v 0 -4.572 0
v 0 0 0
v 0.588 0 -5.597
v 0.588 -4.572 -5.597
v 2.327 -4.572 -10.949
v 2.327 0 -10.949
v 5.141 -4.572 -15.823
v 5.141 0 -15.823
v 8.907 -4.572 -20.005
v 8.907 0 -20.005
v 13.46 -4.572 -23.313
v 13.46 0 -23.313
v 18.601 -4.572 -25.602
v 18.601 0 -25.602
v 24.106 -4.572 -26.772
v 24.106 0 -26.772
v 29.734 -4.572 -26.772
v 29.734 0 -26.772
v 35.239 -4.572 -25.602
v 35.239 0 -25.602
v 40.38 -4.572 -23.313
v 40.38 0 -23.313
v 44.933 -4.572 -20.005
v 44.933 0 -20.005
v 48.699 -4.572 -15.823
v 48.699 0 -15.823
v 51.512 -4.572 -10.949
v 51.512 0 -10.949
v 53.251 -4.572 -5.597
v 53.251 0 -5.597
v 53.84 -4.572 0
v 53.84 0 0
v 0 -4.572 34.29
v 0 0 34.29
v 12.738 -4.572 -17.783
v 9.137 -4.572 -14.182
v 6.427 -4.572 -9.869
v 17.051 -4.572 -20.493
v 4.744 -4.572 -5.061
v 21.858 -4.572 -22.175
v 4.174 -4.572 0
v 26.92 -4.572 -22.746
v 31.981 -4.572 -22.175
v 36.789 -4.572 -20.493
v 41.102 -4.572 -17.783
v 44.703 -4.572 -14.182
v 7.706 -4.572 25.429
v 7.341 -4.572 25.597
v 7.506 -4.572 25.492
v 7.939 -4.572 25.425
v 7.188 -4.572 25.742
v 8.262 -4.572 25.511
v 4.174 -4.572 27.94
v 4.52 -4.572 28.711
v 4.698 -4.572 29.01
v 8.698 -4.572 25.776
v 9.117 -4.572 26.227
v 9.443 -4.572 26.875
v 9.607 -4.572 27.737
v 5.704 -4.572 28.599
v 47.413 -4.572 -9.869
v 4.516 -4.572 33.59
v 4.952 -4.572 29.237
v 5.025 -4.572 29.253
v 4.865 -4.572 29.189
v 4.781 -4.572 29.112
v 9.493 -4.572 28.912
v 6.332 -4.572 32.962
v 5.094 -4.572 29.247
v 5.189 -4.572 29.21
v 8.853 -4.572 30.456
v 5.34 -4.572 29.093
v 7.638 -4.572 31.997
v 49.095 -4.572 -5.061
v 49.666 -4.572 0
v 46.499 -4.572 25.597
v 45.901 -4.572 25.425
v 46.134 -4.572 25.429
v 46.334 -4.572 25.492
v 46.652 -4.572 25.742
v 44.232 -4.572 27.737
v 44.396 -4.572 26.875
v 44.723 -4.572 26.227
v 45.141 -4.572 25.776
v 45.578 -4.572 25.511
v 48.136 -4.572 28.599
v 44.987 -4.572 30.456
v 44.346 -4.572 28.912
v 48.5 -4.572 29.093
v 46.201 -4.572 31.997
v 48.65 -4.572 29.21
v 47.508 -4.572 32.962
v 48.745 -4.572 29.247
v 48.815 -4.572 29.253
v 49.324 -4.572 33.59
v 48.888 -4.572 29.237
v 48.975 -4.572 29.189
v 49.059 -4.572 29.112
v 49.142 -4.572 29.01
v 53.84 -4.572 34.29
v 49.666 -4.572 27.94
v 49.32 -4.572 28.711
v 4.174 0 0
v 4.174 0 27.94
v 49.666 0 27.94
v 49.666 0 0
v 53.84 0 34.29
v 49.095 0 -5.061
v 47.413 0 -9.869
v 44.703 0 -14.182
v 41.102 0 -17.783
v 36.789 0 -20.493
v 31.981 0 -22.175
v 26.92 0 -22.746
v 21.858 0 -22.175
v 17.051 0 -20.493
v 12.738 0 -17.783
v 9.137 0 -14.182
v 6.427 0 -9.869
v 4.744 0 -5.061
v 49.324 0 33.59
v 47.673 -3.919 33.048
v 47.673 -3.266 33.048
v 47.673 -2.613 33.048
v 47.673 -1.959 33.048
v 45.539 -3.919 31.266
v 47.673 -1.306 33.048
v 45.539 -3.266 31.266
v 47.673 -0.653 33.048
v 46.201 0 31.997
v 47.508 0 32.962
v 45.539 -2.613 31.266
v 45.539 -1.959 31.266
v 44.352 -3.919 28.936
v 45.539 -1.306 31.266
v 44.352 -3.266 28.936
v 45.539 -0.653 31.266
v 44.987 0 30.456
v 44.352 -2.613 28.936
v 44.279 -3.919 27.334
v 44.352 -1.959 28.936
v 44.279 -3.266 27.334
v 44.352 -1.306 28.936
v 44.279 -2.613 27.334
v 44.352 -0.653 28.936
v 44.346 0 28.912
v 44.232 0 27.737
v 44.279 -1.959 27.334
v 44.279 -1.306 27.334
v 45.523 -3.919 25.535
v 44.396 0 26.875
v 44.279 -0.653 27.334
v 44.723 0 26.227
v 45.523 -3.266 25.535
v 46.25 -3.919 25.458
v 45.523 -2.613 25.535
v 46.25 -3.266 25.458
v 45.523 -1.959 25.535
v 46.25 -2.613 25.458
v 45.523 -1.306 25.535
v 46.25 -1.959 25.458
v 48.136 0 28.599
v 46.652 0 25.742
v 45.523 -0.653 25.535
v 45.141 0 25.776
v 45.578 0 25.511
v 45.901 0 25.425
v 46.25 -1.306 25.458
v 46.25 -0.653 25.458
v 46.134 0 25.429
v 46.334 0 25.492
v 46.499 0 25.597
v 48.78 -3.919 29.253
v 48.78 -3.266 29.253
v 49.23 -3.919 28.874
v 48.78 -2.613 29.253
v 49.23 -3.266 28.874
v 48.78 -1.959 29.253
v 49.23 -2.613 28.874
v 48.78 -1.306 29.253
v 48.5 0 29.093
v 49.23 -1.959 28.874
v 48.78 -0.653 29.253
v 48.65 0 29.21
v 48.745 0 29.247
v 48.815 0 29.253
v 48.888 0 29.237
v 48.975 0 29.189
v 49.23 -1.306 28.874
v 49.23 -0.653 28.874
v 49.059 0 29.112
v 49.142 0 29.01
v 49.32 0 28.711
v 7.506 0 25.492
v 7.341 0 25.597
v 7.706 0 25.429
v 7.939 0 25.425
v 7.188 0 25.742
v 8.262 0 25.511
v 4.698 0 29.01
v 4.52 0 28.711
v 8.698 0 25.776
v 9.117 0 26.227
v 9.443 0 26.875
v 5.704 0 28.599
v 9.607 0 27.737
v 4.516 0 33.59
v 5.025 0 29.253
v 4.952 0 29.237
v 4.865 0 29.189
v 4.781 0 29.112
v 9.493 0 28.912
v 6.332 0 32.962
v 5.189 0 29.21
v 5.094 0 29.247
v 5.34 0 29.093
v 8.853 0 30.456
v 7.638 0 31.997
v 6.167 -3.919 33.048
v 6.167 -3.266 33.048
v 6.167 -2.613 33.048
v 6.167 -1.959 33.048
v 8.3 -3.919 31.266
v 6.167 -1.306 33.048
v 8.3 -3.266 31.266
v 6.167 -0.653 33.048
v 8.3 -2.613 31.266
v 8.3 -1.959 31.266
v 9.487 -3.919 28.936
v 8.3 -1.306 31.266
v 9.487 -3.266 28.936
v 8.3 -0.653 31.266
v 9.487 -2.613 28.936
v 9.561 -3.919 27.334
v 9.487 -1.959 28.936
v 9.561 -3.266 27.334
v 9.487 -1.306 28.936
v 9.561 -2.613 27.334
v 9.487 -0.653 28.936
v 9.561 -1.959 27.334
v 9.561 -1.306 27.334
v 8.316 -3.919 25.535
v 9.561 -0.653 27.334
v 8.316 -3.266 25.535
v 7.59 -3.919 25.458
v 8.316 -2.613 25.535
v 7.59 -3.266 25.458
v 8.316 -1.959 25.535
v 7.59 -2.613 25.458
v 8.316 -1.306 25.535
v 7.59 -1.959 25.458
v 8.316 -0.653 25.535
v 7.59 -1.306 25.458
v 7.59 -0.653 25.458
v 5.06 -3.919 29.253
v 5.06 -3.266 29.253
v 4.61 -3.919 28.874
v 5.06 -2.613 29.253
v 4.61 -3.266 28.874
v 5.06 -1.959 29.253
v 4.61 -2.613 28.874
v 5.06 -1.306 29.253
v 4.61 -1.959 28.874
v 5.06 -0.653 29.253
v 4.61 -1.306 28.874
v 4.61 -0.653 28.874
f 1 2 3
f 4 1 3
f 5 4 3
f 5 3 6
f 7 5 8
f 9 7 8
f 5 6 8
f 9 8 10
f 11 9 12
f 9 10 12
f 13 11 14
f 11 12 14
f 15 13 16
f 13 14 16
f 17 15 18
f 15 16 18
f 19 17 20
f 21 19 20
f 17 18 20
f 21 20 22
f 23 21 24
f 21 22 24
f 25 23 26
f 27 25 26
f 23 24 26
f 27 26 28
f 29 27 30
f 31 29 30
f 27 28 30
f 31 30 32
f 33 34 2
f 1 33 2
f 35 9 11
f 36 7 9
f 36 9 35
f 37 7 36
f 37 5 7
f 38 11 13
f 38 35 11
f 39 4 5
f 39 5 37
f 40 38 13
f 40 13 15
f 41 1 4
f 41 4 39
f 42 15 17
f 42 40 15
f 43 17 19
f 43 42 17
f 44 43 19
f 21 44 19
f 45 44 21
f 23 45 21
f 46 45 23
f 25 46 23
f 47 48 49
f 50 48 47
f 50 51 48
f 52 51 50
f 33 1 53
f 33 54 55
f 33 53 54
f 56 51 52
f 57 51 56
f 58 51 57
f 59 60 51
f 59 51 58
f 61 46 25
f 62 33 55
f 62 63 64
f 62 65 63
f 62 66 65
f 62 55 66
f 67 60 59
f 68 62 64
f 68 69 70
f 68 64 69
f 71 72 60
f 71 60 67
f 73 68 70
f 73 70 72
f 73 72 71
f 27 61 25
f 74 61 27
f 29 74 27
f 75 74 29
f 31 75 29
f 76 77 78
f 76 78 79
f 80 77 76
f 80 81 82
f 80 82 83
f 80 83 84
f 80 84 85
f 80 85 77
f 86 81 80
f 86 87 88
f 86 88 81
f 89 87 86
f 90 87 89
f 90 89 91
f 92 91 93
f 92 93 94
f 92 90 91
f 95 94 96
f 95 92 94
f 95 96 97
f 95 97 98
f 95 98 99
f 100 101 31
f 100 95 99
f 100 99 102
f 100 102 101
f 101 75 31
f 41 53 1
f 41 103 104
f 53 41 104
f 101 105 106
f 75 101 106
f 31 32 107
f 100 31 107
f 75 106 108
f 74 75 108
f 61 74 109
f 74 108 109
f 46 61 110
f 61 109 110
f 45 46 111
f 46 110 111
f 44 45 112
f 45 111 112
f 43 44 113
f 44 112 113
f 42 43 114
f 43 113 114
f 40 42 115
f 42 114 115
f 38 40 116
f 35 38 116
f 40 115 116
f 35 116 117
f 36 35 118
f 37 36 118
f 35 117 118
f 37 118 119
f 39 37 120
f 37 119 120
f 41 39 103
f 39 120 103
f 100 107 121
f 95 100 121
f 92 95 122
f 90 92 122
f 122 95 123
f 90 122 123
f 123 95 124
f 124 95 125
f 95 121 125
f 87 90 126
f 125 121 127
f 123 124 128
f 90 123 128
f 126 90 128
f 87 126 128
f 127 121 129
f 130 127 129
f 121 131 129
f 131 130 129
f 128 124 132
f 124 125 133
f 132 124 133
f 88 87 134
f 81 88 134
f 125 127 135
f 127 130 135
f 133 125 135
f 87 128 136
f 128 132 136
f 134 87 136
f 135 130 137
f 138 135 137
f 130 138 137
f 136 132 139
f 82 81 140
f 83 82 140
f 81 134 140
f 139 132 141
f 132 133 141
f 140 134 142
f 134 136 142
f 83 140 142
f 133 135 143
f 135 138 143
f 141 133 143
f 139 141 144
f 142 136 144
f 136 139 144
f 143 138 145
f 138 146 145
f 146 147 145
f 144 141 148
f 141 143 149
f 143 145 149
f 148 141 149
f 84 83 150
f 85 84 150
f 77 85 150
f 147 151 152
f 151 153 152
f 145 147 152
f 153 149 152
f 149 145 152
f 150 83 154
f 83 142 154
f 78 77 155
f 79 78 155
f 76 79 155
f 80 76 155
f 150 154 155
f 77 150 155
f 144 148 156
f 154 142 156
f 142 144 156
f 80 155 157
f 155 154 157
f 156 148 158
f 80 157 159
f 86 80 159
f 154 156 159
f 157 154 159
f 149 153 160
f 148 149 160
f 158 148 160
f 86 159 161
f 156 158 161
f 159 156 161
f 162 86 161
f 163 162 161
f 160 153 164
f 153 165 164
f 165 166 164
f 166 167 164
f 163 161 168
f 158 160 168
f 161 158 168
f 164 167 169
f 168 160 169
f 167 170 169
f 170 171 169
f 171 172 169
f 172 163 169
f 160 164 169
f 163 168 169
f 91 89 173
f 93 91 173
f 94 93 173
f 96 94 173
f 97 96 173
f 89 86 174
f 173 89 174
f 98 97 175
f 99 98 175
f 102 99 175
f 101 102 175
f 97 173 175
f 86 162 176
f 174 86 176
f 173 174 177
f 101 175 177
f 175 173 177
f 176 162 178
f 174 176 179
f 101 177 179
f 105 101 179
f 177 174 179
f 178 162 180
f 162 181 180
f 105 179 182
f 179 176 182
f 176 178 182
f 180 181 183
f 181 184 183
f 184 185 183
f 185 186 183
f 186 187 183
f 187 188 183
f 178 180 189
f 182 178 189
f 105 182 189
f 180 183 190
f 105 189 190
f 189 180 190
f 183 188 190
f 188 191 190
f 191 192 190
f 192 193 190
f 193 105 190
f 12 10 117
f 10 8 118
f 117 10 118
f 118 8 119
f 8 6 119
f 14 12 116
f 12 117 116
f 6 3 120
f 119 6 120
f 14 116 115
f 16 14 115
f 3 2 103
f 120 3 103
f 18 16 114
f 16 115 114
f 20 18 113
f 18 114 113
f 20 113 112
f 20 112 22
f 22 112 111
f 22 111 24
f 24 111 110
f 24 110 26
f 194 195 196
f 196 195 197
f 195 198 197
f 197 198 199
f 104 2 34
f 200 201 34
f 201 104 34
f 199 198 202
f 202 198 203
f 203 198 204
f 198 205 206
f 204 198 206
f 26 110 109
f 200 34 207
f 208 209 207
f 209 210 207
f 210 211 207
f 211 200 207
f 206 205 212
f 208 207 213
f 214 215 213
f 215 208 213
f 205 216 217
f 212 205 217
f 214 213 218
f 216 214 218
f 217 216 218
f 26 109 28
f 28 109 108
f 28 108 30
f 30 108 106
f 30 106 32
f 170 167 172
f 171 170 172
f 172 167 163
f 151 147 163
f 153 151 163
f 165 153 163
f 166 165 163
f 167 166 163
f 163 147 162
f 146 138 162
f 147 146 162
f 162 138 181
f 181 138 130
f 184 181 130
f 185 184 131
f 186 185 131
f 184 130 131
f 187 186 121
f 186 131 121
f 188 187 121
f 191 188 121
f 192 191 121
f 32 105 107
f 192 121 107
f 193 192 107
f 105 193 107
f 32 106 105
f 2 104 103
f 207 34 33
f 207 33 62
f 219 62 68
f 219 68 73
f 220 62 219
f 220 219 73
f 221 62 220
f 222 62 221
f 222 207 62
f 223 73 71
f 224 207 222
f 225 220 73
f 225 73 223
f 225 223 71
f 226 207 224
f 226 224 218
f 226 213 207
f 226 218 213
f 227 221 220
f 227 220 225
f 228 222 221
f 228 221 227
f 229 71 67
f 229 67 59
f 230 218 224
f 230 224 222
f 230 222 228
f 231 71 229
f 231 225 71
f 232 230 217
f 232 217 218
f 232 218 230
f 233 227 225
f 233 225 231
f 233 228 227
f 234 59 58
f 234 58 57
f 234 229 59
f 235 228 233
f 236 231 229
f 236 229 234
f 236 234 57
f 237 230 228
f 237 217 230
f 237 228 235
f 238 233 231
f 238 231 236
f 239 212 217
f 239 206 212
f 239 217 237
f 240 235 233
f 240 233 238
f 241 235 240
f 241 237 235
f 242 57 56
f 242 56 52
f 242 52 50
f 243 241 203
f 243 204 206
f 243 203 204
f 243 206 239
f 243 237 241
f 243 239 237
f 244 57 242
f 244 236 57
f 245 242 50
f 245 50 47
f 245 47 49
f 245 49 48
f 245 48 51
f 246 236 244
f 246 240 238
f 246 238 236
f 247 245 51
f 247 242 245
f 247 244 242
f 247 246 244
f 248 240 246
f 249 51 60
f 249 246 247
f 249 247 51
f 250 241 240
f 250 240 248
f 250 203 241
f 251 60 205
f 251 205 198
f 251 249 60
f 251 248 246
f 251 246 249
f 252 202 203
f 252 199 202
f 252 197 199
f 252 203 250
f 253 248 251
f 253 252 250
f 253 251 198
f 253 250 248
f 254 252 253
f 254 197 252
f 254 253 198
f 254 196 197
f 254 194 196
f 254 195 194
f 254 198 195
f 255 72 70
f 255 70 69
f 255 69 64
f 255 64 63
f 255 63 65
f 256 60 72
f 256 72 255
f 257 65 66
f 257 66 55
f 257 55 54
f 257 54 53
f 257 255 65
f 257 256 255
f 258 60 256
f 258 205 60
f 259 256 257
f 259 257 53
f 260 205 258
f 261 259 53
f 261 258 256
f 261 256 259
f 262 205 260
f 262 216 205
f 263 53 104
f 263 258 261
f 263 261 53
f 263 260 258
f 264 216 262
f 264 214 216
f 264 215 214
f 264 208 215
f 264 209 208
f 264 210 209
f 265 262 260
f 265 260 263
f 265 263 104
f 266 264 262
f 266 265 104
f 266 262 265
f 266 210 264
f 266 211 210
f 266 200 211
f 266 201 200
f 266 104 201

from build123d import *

# Parameters (mm, degrees)
F1_DEPTH = 4.572


with BuildPart() as f1:
    # F0 (on Front) → F1 (new body)
    with BuildSketch(Plane.XZ):
        with BuildLine():
            Line((0, 34.29), (0, 0))
            ThreePointArc((0, 0), (26.9198719018, -26.9198719018), (53.8397438036, 0))
            Line((53.8397438036, 0), (53.8397438036, 34.29))
            add(Edge.make_bspline(
                [(53.8397438036, 34.29), (51.685905008, 33.7274732412), (47.4360628088, 34.1344134357), (43.7819059505, 29.1943330988), (44.436788476, 25.9961819248), (46.5119035184, 24.9576054918), (47.4412733442, 27.2815292023), (48.789808972, 30.0286001615), (49.3621611426, 28.6549786971), (49.6655719018, 27.94)],
                knots=[0, 0, 0, 0, 0.2084508028, 0.39950864, 0.5406852081, 0.6444008875, 0.7699077507, 0.8954145643, 1, 1, 1, 1], degree=3))
            Line((49.6655719018, 27.94), (49.6655719018, 0))
            ThreePointArc((49.6655719018, 0), (26.9198719018, -22.7457), (4.1741719018, 0))
            Line((4.1741719018, 0), (4.1741719018, 27.94))
            add(Edge.make_bspline(
                [(0, 34.29), (2.1538387956, 33.7274732412), (6.4036809948, 34.1344134357), (10.0578378531, 29.1943330988), (9.4029553275, 25.9961819248), (7.3278402852, 24.9576054918), (6.3984704594, 27.2815292023), (5.0499348315, 30.0286001615), (4.4775826609, 28.6549786971), (4.1741719018, 27.94)],
                knots=[0, 0, 0, 0, 0.2084508028, 0.39950864, 0.5406852081, 0.6444008875, 0.7699077507, 0.8954145643, 1, 1, 1, 1], degree=3))
        make_face()
    extrude(amount=F1_DEPTH)


solid = f1.part
